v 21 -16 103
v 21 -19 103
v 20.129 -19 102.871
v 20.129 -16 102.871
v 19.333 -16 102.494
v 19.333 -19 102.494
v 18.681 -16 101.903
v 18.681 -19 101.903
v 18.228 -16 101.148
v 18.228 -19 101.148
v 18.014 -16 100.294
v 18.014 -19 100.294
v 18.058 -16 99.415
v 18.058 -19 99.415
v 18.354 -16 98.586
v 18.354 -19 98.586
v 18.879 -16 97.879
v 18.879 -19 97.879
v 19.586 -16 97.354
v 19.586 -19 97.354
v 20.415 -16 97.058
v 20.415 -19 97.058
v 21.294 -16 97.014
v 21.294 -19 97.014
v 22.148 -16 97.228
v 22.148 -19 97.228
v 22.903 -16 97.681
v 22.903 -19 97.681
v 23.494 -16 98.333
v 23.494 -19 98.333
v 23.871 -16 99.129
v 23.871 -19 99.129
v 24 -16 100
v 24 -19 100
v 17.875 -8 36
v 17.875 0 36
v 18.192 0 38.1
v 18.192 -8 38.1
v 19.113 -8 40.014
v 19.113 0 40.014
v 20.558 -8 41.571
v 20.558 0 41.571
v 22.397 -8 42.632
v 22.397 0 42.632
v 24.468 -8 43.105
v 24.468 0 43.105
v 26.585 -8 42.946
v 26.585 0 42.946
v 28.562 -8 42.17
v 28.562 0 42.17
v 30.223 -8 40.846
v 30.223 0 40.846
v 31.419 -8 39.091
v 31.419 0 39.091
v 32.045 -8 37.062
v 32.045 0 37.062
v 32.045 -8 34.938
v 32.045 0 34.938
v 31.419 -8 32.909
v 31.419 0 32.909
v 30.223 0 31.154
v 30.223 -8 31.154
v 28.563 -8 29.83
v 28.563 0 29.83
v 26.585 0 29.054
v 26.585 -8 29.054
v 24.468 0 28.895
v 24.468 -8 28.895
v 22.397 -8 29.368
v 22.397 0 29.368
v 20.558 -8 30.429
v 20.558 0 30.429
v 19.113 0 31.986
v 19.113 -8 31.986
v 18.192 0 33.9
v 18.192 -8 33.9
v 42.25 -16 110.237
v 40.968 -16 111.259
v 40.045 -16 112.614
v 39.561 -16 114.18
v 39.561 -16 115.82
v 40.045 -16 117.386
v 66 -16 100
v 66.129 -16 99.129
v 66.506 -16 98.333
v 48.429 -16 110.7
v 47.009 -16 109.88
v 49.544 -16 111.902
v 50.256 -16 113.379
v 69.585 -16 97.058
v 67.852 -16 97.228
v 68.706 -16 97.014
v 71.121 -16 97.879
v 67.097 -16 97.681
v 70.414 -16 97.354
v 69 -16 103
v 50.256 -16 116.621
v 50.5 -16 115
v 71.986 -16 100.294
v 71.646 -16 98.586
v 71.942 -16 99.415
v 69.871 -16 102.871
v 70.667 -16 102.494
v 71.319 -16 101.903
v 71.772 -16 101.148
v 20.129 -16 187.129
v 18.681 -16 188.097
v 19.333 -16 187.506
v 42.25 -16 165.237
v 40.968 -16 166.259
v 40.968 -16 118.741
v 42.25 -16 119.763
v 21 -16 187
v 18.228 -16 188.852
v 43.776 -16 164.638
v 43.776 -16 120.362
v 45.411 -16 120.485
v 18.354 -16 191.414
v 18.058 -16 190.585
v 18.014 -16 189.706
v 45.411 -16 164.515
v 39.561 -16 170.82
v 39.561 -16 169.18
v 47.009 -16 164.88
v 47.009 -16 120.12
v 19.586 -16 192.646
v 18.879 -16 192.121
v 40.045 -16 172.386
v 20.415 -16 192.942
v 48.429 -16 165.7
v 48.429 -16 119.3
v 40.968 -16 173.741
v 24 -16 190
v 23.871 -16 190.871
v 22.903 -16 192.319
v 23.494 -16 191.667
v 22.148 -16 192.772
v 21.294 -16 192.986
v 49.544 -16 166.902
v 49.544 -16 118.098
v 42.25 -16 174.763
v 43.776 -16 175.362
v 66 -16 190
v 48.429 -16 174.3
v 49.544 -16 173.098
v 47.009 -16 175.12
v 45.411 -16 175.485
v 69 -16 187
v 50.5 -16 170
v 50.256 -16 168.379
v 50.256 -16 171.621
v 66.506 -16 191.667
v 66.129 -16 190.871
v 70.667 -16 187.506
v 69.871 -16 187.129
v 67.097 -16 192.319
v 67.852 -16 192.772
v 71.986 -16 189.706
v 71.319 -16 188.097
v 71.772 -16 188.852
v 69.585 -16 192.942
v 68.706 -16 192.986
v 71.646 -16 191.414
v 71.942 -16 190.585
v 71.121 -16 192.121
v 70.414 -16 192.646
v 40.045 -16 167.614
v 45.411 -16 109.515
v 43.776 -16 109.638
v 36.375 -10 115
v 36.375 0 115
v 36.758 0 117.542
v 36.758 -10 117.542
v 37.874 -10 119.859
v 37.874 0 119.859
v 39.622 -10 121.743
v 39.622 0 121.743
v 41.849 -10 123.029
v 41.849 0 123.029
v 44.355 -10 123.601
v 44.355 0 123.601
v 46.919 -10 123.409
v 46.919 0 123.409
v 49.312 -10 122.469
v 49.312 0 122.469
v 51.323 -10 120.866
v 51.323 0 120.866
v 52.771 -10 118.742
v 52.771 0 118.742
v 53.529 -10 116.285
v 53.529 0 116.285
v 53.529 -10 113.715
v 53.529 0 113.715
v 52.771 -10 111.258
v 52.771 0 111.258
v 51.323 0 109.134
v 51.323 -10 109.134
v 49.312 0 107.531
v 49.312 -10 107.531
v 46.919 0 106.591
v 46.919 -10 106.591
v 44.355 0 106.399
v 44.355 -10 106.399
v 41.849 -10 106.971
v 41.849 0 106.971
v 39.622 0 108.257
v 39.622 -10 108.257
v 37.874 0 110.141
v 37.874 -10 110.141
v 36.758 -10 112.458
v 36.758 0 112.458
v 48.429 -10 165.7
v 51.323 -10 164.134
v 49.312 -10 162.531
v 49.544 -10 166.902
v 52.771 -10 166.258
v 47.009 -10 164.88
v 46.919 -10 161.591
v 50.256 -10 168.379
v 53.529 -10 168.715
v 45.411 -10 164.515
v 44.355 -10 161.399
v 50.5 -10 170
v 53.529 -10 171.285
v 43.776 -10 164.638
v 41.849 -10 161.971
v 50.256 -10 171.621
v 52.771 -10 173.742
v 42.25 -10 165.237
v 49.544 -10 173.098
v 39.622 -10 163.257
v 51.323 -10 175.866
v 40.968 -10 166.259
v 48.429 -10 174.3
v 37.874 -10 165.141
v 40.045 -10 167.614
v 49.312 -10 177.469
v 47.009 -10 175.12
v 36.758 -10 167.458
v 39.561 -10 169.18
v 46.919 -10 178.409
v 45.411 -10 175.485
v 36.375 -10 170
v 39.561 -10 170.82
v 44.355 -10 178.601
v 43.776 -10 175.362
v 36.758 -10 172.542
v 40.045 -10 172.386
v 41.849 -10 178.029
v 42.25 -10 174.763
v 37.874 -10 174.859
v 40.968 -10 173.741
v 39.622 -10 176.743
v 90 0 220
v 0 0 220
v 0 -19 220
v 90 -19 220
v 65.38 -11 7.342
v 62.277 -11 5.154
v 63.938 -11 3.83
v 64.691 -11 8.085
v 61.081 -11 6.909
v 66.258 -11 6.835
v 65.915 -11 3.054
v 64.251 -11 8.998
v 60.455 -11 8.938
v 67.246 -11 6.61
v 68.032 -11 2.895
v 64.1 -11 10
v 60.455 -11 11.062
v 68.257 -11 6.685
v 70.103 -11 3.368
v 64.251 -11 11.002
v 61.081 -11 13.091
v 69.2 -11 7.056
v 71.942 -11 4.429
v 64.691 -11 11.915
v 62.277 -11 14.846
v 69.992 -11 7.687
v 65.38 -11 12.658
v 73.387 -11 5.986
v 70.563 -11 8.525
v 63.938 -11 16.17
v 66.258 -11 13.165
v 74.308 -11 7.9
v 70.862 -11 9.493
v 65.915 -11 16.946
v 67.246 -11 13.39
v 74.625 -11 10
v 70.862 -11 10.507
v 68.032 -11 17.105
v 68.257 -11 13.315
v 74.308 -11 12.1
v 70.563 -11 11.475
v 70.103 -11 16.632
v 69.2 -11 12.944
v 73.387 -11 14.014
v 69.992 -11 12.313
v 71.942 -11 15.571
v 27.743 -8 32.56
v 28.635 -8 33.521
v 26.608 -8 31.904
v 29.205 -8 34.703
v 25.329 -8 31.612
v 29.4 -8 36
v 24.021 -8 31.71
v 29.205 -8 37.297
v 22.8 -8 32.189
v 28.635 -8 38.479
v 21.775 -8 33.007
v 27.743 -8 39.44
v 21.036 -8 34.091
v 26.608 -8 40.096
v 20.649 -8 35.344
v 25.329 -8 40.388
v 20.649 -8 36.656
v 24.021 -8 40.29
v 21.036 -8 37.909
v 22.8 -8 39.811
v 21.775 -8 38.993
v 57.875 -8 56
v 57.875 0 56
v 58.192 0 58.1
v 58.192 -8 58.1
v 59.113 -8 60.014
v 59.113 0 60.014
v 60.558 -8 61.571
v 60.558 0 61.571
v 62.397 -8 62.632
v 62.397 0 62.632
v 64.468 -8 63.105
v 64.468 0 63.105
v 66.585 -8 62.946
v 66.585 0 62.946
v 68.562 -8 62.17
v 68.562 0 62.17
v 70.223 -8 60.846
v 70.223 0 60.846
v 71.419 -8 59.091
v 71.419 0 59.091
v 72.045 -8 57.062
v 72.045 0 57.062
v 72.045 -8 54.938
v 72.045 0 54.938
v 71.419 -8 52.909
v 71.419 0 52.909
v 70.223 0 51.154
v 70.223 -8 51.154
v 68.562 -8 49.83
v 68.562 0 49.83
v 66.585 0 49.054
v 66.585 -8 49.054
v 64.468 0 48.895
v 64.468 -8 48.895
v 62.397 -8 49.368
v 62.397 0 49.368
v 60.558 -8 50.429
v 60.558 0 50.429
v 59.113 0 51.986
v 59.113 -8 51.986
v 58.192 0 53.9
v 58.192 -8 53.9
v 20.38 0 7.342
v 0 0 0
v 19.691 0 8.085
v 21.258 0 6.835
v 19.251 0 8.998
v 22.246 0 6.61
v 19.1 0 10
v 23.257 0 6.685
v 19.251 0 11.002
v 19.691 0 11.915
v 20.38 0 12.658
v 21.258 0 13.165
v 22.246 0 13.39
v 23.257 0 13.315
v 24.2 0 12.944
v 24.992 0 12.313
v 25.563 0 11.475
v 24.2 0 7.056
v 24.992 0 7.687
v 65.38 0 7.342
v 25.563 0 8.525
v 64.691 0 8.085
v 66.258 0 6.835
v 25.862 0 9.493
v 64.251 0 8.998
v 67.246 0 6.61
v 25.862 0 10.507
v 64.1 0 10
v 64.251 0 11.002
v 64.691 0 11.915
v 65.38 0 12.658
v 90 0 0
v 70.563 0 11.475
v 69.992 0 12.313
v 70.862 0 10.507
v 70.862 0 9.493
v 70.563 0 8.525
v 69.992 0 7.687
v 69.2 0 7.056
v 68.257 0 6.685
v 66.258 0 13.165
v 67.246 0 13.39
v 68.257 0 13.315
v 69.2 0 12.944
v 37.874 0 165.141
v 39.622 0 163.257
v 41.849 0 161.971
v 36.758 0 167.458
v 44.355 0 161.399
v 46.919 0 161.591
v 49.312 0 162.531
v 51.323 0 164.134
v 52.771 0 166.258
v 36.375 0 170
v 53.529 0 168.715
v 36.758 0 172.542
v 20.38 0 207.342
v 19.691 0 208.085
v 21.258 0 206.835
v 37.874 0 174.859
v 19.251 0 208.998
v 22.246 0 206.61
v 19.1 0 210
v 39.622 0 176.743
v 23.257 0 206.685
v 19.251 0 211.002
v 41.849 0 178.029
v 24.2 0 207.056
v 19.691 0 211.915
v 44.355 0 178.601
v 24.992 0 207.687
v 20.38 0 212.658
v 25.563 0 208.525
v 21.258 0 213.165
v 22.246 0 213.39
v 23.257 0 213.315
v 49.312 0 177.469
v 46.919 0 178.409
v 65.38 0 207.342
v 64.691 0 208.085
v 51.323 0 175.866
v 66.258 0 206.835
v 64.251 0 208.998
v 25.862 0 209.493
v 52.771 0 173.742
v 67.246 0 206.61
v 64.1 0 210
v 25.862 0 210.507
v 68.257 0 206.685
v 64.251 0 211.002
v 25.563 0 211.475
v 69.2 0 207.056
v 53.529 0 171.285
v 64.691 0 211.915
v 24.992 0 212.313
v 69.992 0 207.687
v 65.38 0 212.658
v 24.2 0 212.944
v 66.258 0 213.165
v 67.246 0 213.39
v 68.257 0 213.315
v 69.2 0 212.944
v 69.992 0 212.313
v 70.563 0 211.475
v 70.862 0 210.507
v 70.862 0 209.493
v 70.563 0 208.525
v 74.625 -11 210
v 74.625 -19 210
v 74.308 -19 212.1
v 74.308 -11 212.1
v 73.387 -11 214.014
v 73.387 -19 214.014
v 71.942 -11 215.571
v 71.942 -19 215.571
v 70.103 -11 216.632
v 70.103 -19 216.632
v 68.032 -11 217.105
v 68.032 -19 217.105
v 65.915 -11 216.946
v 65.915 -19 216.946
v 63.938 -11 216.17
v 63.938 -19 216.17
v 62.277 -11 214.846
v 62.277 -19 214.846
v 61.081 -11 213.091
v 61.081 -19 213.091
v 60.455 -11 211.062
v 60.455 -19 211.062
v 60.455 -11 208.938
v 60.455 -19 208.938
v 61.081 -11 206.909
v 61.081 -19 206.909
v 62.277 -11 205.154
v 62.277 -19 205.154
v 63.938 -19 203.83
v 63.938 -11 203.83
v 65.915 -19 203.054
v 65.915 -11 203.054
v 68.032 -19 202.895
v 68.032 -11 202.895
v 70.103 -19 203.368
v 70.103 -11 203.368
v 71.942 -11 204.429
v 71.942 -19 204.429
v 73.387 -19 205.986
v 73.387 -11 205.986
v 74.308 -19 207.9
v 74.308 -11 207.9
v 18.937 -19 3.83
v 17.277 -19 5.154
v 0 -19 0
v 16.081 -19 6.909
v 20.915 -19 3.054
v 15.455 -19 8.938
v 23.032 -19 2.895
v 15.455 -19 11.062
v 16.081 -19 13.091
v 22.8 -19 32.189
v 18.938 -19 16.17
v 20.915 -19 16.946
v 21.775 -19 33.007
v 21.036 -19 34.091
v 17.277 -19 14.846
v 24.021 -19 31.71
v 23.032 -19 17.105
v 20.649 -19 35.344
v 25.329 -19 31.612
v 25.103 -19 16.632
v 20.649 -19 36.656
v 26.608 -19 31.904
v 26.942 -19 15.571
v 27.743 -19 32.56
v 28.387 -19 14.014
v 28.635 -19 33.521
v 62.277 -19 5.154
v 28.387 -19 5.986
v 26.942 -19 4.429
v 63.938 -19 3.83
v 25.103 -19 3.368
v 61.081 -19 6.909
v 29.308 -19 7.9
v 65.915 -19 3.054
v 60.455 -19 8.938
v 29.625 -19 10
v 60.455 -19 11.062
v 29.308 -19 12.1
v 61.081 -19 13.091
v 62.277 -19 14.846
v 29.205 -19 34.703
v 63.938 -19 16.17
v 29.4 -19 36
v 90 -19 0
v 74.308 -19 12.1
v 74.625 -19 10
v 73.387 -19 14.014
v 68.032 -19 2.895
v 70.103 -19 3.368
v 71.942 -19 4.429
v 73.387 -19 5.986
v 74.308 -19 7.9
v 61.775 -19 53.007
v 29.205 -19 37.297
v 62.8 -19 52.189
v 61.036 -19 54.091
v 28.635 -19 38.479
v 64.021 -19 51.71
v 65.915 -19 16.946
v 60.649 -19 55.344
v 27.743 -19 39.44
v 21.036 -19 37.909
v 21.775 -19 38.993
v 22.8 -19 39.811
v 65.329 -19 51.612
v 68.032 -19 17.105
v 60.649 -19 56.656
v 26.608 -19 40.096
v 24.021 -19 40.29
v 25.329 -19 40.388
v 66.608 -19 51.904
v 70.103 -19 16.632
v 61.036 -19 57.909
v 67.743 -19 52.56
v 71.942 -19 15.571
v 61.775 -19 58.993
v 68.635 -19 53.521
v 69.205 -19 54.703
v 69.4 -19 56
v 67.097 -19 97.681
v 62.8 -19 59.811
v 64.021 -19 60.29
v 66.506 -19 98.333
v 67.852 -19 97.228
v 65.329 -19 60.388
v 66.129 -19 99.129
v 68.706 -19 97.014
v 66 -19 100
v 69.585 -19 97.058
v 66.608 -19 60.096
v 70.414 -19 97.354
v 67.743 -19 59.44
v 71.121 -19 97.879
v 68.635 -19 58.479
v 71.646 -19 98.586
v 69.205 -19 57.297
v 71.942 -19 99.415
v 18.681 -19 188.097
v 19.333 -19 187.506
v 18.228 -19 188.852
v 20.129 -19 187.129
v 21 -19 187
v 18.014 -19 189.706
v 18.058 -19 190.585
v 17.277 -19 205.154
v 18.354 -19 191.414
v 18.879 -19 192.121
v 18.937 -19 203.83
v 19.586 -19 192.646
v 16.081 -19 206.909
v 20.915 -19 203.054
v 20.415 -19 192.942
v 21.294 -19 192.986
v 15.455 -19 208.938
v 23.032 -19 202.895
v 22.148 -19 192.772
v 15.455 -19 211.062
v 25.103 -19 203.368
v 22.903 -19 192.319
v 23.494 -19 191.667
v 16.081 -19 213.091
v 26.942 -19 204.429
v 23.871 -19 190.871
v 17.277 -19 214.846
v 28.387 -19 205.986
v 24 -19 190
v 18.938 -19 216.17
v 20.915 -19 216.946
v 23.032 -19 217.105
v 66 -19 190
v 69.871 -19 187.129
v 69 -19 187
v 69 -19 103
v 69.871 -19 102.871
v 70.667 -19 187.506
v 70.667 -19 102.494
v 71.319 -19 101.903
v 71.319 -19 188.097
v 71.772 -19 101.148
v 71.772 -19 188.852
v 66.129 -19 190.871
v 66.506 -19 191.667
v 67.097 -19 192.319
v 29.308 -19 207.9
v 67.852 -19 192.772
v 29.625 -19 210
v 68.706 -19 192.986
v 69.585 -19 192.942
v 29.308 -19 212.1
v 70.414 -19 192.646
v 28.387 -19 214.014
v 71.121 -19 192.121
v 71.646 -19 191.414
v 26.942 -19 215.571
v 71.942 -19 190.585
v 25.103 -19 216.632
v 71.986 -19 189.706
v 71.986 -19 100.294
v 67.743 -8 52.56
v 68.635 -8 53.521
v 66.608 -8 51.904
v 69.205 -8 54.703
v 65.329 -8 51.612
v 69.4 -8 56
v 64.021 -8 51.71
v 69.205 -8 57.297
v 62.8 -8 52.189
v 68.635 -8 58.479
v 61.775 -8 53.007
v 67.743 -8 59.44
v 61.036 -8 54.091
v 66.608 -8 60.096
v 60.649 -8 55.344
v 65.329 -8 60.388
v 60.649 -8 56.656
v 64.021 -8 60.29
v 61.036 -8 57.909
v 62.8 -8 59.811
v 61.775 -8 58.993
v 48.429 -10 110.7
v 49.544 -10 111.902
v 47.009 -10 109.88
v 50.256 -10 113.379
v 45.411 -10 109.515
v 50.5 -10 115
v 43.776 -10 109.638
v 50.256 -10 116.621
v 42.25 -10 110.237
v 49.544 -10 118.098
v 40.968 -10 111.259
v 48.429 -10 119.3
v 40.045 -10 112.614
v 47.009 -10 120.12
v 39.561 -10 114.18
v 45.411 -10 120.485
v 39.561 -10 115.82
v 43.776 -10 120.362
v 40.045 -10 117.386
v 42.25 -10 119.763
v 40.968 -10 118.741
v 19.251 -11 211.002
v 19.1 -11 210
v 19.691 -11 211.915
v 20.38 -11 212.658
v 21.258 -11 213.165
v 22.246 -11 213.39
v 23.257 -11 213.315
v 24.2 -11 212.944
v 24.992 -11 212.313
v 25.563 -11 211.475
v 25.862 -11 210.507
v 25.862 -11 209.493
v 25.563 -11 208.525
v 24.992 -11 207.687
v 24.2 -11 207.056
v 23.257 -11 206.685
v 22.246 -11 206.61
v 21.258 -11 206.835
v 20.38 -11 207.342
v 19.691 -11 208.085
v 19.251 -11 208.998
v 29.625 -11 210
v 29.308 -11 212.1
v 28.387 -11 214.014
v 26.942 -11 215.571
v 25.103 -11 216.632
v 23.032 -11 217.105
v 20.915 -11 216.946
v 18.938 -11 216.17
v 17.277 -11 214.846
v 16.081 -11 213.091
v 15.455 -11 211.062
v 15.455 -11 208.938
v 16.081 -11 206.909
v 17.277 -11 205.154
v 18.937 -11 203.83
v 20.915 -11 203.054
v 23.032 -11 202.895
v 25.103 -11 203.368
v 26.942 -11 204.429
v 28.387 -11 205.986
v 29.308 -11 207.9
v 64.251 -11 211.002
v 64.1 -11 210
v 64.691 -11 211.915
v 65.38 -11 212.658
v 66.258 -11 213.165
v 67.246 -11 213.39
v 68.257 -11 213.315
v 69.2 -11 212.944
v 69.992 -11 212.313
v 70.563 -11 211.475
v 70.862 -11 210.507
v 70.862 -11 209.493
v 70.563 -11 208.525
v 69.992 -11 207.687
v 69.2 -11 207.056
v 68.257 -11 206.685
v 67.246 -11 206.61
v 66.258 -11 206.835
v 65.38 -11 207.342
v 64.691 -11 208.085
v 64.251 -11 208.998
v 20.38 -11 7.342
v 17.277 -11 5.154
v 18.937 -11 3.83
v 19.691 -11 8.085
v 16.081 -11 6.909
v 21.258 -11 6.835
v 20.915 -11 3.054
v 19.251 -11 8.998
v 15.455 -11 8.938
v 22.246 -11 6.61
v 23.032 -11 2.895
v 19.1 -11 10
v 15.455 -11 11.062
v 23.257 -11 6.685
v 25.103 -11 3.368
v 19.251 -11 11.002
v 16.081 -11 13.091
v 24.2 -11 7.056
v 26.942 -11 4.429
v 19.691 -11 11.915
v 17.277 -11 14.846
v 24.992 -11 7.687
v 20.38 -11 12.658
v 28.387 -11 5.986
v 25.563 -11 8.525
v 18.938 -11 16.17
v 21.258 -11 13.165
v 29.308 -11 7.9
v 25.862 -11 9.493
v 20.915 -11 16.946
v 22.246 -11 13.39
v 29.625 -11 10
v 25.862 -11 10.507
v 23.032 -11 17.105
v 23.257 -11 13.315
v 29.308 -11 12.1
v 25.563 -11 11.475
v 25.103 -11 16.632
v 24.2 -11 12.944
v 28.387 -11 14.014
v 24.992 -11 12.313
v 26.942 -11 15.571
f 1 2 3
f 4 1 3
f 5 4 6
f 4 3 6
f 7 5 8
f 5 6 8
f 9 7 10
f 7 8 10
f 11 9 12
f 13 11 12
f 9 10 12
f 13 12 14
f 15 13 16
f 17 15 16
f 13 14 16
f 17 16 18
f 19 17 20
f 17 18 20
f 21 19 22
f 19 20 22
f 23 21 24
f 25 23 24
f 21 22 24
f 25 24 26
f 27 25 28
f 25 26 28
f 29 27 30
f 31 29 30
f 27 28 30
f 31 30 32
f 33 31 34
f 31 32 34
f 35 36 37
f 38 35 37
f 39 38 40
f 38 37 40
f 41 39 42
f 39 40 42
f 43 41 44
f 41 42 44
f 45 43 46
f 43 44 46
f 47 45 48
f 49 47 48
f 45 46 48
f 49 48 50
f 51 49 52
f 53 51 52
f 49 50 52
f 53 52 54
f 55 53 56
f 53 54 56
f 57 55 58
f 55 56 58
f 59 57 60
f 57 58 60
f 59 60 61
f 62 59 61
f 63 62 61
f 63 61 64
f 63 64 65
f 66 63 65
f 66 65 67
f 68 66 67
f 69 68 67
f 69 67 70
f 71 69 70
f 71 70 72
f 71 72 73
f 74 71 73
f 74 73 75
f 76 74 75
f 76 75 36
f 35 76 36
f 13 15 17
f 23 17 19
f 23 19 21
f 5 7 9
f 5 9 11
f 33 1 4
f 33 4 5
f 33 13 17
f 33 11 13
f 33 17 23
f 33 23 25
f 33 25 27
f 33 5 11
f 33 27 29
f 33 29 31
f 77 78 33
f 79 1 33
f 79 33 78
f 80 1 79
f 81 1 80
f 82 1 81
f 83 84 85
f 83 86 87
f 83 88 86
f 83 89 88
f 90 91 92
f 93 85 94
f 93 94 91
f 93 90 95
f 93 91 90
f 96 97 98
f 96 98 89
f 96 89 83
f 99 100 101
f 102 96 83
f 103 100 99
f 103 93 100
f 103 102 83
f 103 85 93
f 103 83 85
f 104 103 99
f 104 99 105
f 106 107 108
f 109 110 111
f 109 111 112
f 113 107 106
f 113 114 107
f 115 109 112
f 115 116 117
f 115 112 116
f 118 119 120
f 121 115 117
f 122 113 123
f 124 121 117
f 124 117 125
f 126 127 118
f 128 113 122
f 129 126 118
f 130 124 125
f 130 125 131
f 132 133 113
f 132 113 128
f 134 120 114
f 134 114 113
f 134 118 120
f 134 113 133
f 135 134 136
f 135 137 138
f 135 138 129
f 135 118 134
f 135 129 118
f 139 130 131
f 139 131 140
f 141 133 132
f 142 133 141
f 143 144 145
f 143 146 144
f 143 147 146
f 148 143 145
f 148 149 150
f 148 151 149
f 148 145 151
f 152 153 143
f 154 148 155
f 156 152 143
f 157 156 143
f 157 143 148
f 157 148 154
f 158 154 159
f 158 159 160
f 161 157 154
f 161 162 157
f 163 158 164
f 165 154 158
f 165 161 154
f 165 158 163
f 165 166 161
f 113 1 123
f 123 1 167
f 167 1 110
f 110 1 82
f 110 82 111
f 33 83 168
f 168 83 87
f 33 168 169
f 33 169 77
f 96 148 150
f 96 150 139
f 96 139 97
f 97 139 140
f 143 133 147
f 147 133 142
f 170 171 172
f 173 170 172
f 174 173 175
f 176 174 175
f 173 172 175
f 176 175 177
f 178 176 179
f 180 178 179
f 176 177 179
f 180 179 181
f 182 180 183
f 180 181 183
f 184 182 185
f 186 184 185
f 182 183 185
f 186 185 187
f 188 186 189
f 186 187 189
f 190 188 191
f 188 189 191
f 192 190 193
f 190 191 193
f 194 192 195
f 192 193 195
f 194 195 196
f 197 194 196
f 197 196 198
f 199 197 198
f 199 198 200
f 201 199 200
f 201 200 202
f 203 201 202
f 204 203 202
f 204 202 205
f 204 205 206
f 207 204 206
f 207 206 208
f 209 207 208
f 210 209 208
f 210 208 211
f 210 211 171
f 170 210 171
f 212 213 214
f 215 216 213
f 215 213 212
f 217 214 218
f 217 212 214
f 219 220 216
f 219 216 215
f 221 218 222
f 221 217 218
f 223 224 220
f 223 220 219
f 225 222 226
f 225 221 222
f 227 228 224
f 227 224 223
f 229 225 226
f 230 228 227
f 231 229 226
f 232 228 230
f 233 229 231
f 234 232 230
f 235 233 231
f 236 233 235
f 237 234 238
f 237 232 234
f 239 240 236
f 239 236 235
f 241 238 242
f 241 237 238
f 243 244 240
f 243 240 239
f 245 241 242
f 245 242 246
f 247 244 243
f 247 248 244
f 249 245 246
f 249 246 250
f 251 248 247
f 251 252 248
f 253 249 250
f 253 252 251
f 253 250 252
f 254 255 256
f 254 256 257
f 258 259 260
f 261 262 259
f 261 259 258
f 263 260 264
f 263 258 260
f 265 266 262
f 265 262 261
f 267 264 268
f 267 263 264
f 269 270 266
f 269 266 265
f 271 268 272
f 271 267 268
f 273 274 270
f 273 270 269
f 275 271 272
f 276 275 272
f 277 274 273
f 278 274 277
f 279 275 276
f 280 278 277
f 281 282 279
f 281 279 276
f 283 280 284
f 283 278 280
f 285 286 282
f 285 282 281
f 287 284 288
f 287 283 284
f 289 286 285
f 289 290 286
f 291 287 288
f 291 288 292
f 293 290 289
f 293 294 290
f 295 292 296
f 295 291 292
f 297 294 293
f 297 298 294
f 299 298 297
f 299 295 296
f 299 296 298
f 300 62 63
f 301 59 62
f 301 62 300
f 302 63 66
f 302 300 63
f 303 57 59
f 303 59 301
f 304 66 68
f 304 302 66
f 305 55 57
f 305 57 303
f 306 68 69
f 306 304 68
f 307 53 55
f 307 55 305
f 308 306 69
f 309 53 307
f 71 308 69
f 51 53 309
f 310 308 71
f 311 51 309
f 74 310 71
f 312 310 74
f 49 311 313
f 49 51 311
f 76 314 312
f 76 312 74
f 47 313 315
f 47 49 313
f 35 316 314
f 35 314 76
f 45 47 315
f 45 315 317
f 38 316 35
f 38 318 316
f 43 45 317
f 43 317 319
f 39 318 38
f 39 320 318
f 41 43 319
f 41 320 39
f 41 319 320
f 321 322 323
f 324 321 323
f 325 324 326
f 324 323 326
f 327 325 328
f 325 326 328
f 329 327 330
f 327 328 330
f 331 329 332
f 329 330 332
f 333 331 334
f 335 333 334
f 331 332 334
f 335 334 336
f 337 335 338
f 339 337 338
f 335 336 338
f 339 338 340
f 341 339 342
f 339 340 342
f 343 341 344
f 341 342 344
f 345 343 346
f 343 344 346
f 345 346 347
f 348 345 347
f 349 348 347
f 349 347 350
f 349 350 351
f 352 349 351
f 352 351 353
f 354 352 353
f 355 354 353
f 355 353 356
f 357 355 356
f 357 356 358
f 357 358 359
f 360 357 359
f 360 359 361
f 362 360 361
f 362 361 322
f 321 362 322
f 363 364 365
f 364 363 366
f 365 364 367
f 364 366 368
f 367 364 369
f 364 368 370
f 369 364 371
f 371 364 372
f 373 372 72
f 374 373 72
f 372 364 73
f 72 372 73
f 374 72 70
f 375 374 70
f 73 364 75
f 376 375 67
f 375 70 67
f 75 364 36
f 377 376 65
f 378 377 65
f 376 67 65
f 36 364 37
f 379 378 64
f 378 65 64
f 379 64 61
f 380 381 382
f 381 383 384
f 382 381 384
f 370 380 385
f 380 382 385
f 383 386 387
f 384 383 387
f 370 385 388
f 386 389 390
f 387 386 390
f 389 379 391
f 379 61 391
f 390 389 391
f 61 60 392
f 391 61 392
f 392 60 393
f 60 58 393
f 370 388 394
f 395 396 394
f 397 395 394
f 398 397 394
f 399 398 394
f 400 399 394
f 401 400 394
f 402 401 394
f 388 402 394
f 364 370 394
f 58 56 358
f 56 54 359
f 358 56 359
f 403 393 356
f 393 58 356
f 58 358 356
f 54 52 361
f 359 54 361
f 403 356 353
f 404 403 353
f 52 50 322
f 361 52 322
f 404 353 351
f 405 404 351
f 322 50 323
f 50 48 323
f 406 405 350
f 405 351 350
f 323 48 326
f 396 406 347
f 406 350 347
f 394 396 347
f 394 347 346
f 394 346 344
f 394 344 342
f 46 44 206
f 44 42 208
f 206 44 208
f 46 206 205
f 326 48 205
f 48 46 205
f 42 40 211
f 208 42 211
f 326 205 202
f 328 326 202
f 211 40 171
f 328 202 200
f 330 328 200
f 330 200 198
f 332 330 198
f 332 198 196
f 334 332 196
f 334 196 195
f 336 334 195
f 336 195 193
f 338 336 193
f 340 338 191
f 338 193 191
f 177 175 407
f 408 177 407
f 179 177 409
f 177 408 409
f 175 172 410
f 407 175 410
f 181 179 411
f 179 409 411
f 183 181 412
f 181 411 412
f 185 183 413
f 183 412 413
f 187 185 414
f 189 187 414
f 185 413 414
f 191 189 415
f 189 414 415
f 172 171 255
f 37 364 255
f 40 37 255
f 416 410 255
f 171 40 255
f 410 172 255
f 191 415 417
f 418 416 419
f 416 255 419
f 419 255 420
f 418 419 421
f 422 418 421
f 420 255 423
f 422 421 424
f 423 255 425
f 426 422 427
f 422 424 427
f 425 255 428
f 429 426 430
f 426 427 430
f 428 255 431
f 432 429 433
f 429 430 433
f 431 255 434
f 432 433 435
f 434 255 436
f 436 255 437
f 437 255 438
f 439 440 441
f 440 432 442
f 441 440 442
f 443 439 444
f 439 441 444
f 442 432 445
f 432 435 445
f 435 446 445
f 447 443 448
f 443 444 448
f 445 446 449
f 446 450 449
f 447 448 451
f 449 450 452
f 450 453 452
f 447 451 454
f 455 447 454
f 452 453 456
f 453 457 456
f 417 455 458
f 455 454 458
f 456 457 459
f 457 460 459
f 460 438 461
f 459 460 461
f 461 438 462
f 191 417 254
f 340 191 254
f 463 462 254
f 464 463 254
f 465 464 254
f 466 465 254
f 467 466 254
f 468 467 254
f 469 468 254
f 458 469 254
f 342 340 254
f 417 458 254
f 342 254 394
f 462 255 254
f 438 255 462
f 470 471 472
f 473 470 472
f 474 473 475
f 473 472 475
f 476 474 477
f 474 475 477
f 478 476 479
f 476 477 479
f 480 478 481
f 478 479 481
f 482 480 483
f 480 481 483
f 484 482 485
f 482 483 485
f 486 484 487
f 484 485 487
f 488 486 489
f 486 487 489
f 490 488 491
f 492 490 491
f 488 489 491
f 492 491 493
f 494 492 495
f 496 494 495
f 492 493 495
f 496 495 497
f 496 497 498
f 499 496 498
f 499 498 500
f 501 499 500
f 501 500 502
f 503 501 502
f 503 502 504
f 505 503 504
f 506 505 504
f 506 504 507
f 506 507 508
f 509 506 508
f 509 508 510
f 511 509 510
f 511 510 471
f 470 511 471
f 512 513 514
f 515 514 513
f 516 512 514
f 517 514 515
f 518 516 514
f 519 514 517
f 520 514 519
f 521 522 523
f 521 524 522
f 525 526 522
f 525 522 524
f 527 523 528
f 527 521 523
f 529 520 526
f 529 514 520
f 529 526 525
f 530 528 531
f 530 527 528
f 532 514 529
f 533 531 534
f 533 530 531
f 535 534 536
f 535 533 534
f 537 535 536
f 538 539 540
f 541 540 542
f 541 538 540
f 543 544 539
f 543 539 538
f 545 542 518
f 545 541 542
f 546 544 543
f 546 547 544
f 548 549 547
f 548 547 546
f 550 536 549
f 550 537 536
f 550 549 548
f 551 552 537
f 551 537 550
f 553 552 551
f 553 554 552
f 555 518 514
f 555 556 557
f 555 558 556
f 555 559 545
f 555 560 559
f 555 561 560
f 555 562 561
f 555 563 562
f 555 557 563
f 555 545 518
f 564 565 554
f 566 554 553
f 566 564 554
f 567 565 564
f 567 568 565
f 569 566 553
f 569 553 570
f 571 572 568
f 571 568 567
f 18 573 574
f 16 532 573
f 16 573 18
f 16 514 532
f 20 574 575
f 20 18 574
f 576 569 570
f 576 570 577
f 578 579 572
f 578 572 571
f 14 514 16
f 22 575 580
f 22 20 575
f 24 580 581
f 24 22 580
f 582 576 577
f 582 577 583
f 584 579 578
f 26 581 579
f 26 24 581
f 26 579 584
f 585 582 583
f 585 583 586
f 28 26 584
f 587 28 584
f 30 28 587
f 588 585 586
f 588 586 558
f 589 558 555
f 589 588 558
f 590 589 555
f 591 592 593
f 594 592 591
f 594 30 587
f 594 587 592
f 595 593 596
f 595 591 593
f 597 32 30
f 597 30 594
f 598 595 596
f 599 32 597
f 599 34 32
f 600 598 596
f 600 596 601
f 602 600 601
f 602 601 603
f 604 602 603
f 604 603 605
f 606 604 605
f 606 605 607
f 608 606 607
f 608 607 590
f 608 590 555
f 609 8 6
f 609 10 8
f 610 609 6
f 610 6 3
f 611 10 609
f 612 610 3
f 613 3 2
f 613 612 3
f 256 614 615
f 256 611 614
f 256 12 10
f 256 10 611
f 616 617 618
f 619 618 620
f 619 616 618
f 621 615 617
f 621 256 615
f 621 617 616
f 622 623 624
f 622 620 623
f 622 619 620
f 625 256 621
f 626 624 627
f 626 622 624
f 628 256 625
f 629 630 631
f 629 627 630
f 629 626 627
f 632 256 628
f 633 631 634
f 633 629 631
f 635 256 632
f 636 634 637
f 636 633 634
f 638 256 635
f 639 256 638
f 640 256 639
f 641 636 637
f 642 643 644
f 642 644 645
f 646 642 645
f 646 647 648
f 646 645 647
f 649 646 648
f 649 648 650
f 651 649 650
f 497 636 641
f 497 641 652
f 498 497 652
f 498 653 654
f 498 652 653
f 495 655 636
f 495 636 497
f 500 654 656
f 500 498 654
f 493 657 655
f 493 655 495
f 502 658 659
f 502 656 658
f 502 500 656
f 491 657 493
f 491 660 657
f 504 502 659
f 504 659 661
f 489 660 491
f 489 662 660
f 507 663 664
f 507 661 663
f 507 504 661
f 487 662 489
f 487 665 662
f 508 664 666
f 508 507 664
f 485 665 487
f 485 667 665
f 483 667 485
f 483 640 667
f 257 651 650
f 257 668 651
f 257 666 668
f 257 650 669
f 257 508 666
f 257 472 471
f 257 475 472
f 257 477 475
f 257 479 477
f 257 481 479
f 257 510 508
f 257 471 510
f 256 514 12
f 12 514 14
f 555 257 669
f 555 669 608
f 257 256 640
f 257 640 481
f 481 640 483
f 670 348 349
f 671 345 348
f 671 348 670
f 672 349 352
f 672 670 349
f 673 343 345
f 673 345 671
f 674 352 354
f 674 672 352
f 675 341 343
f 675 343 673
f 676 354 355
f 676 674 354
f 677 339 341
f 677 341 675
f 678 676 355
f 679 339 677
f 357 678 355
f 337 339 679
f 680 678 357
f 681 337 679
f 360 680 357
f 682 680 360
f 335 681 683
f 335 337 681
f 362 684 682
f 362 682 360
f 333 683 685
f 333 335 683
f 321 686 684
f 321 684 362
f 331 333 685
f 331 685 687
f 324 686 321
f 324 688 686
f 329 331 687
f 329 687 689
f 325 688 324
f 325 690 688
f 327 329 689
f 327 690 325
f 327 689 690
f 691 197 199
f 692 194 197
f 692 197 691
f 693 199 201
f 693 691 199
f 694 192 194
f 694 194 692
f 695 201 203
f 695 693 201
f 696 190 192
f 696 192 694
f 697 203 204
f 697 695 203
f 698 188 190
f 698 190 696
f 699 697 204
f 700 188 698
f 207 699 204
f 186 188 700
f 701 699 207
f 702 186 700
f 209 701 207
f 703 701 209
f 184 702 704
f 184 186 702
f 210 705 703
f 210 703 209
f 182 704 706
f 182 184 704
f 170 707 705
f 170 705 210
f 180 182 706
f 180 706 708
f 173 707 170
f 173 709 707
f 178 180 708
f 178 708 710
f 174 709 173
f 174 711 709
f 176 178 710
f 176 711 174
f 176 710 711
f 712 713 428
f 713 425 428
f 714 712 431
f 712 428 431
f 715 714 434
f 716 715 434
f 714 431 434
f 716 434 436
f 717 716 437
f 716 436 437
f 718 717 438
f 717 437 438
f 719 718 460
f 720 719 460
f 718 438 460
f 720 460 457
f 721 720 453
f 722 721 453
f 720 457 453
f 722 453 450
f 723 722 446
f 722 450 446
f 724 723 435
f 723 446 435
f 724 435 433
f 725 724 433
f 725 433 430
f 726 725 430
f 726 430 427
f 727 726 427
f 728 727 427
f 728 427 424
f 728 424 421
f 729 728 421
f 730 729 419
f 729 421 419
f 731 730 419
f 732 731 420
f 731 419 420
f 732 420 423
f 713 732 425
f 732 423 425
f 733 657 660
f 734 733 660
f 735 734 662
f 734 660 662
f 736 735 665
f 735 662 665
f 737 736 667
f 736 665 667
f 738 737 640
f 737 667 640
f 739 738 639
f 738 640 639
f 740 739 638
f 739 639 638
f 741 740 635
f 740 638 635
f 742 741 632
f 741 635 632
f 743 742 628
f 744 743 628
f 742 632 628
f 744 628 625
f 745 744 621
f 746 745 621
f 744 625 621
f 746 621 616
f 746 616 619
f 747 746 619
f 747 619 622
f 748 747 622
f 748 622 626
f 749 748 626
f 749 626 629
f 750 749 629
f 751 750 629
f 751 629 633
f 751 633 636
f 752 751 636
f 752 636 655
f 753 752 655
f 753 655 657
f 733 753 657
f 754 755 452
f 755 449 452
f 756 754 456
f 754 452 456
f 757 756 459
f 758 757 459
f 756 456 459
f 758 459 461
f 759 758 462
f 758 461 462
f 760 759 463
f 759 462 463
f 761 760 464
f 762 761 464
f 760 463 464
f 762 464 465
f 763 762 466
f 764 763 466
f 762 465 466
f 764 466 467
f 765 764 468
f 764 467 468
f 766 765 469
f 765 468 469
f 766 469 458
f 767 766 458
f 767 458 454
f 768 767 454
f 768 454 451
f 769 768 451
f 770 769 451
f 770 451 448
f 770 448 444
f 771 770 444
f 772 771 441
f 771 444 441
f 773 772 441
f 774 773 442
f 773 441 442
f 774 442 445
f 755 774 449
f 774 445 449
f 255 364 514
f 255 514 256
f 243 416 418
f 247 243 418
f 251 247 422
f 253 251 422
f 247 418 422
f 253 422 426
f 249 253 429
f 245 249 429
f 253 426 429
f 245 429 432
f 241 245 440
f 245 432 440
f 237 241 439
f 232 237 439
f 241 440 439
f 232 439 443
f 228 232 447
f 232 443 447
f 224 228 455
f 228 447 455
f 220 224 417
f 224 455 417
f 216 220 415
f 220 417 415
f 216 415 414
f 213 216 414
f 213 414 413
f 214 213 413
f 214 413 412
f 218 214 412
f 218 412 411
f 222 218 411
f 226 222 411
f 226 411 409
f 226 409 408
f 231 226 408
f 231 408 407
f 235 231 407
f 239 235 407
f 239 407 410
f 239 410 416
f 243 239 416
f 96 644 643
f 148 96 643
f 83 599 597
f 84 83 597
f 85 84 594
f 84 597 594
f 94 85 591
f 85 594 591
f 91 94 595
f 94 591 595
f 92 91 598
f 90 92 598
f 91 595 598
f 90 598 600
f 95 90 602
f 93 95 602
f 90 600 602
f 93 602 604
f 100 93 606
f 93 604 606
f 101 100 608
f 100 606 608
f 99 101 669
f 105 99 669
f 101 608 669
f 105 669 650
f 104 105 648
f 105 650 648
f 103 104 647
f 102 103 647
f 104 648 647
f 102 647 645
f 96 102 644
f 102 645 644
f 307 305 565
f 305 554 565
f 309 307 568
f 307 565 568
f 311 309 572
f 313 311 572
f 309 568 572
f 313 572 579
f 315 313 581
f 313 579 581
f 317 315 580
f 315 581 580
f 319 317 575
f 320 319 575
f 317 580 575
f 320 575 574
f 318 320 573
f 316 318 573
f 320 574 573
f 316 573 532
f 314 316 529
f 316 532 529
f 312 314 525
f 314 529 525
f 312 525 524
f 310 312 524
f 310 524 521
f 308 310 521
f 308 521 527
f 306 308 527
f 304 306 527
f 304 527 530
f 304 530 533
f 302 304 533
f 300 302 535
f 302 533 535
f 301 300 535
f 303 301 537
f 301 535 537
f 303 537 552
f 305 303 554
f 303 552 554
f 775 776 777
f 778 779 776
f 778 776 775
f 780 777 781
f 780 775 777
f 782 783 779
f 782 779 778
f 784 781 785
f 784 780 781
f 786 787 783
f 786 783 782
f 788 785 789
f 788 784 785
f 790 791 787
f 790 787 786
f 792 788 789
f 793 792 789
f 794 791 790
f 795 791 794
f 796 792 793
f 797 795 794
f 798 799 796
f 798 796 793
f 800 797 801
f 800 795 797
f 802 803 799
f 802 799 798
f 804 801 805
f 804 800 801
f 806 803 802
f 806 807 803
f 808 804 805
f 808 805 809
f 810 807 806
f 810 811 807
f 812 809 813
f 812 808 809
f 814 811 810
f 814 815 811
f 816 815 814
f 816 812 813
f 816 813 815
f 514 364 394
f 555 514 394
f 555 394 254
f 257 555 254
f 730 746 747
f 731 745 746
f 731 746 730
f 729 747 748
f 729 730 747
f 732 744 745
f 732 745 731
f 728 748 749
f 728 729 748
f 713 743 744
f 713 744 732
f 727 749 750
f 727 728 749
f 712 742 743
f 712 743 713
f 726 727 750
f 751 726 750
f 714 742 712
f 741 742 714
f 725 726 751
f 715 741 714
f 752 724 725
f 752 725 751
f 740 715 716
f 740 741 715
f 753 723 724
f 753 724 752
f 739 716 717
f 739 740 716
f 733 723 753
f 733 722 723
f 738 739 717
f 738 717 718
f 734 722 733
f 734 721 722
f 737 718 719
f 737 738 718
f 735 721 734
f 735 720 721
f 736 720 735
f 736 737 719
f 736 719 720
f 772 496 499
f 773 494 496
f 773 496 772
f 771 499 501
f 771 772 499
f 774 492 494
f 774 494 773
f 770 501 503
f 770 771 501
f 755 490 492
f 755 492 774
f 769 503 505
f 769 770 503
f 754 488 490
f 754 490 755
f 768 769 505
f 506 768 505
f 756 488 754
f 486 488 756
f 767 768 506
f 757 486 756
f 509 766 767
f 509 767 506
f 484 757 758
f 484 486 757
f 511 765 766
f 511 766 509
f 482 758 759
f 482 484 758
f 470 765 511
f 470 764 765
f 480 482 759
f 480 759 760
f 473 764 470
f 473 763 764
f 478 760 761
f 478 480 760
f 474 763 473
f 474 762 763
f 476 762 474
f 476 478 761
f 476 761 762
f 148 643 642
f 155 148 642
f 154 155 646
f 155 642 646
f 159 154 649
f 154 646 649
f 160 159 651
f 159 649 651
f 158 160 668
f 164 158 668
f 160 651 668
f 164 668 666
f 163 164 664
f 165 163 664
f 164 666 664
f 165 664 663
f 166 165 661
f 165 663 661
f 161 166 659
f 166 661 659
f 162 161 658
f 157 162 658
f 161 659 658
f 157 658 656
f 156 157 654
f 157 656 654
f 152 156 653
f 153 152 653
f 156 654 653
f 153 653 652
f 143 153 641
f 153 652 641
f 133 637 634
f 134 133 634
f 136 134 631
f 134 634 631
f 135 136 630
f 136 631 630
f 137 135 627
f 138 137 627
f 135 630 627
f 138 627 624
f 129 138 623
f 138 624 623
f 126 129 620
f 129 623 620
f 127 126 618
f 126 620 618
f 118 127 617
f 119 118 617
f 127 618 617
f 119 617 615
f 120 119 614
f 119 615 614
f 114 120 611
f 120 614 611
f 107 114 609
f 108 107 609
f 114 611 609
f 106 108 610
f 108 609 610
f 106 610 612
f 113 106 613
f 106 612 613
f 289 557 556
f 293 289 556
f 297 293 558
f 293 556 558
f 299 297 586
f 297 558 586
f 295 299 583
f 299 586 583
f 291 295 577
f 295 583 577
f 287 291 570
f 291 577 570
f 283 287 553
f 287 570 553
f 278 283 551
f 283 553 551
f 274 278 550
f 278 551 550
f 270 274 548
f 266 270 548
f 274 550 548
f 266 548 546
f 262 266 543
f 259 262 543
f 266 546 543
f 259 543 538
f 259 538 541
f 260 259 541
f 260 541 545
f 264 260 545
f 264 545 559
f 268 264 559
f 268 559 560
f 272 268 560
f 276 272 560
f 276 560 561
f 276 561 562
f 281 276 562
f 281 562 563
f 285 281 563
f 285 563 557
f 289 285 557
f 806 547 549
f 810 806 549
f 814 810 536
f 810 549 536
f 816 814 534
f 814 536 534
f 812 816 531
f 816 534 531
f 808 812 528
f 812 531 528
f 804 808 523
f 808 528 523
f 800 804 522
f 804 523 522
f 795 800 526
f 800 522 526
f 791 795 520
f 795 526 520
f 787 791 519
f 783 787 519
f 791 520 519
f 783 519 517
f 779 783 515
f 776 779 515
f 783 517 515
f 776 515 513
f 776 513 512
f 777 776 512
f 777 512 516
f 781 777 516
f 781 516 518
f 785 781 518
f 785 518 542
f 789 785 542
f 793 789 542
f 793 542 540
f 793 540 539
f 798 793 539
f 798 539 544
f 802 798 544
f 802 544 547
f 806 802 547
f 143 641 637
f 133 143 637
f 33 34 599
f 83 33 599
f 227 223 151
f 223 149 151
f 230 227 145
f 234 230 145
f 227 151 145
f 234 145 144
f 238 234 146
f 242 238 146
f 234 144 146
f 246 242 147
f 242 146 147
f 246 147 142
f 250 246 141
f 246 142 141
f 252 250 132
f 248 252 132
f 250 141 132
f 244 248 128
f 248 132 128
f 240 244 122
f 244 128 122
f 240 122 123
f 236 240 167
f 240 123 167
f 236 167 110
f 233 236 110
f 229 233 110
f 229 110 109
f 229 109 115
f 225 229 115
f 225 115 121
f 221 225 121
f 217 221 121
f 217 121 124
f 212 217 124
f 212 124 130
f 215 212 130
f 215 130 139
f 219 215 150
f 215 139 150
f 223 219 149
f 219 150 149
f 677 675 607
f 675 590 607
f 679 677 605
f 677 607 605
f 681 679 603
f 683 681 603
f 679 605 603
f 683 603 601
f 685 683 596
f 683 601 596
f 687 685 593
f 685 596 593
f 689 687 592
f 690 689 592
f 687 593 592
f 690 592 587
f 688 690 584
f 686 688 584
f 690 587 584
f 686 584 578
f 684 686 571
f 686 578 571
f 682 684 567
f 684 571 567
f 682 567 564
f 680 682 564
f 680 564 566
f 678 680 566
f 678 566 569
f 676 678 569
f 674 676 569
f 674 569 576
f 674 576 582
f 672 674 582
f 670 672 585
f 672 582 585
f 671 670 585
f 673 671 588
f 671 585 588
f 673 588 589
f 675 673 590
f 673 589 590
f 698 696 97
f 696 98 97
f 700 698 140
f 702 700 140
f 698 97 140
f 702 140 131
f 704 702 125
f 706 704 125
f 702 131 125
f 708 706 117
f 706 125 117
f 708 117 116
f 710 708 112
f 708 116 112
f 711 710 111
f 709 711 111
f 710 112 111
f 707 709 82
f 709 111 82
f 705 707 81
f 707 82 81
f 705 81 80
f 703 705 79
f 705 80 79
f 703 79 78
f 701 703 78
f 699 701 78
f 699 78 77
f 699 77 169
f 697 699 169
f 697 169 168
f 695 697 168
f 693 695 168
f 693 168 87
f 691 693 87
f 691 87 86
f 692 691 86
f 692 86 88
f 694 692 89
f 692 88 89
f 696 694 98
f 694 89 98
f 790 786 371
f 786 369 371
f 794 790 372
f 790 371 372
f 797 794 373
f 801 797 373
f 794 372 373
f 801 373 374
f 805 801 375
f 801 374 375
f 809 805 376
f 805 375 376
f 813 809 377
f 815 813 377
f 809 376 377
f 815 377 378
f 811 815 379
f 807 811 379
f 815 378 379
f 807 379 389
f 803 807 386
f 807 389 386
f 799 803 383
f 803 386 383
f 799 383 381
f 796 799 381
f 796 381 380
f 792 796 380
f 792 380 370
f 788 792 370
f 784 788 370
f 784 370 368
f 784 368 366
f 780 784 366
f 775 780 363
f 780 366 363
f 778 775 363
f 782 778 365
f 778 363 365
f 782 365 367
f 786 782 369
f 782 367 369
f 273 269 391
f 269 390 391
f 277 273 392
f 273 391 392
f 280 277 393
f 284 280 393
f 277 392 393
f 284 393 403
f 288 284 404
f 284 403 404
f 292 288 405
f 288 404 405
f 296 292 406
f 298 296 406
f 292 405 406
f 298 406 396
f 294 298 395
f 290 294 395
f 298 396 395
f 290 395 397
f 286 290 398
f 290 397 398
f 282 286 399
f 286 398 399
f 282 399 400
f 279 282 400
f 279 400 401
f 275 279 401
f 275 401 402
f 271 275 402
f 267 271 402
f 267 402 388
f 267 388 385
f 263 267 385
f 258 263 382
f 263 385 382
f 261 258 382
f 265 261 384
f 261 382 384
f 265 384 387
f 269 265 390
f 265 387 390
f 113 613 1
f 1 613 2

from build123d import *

# Parameters (mm, degrees)
F0_W           = 90
F0_H           = 220
F1_DEPTH       = 19
F3_D           = 6.8
F3_CBORE_D     = 14.25
F3_CBORE_DEPTH = 8
F5_DEPTH       = 3
F7_D           = 11
F7_CBORE_D     = 17.25
F7_CBORE_DEPTH = 10
F9_D           = 8.8
F9_CBORE_D     = 14.25
F9_CBORE_DEPTH = 8


with BuildPart() as f1:
    # F0 (on Front) → F1 (new body)
    with BuildSketch(Plane.XZ):
        with Locations((45, 110)):
            Rectangle(F0_W, F0_H)
    extrude(amount=F1_DEPTH)

    # F3 (through all)
    with Locations(Plane.XZ.offset(19)):
        with Locations((22.5, 210), (67.5, 210), (22.5, 10), (67.5, 10)):
            CounterBoreHole(F3_D / 2, F3_CBORE_D / 2, F3_CBORE_DEPTH)

    # F4 (on face) → F5 (cut)
    with BuildSketch(Plane.XZ.offset(19)):
        with BuildLine():
            ThreePointArc((24, 190), (18.8786796564, 192.1213203436), (21, 187))
            Line((21, 187), (21, 103))
            ThreePointArc((21, 103), (18.8786796564, 97.8786796564), (24, 100))
            Line((24, 100), (66, 100))
            ThreePointArc((66, 100), (71.1213203436, 97.8786796564), (69, 103))
            Line((69, 103), (69, 187))
            ThreePointArc((69, 187), (71.1213203436, 192.1213203436), (66, 190))
            Line((66, 190), (24, 190))
        make_face()
    extrude(amount=-F5_DEPTH, mode=Mode.SUBTRACT)

    # F7 (through all)
    with Locations(Plane(origin=(0, 0, 0), x_dir=(-1, 0, 0), z_dir=(0, 1, 0))):
        with Locations((-45, 170), (-45, 115)):
            CounterBoreHole(F7_D / 2, F7_CBORE_D / 2, F7_CBORE_DEPTH)

    # F9 (through all)
    with Locations(Plane(origin=(0, 0, 0), x_dir=(-1, 0, 0), z_dir=(0, 1, 0))):
        with Locations((-65, 56), (-25, 36)):
            CounterBoreHole(F9_D / 2, F9_CBORE_D / 2, F9_CBORE_DEPTH)


solid = f1.part
